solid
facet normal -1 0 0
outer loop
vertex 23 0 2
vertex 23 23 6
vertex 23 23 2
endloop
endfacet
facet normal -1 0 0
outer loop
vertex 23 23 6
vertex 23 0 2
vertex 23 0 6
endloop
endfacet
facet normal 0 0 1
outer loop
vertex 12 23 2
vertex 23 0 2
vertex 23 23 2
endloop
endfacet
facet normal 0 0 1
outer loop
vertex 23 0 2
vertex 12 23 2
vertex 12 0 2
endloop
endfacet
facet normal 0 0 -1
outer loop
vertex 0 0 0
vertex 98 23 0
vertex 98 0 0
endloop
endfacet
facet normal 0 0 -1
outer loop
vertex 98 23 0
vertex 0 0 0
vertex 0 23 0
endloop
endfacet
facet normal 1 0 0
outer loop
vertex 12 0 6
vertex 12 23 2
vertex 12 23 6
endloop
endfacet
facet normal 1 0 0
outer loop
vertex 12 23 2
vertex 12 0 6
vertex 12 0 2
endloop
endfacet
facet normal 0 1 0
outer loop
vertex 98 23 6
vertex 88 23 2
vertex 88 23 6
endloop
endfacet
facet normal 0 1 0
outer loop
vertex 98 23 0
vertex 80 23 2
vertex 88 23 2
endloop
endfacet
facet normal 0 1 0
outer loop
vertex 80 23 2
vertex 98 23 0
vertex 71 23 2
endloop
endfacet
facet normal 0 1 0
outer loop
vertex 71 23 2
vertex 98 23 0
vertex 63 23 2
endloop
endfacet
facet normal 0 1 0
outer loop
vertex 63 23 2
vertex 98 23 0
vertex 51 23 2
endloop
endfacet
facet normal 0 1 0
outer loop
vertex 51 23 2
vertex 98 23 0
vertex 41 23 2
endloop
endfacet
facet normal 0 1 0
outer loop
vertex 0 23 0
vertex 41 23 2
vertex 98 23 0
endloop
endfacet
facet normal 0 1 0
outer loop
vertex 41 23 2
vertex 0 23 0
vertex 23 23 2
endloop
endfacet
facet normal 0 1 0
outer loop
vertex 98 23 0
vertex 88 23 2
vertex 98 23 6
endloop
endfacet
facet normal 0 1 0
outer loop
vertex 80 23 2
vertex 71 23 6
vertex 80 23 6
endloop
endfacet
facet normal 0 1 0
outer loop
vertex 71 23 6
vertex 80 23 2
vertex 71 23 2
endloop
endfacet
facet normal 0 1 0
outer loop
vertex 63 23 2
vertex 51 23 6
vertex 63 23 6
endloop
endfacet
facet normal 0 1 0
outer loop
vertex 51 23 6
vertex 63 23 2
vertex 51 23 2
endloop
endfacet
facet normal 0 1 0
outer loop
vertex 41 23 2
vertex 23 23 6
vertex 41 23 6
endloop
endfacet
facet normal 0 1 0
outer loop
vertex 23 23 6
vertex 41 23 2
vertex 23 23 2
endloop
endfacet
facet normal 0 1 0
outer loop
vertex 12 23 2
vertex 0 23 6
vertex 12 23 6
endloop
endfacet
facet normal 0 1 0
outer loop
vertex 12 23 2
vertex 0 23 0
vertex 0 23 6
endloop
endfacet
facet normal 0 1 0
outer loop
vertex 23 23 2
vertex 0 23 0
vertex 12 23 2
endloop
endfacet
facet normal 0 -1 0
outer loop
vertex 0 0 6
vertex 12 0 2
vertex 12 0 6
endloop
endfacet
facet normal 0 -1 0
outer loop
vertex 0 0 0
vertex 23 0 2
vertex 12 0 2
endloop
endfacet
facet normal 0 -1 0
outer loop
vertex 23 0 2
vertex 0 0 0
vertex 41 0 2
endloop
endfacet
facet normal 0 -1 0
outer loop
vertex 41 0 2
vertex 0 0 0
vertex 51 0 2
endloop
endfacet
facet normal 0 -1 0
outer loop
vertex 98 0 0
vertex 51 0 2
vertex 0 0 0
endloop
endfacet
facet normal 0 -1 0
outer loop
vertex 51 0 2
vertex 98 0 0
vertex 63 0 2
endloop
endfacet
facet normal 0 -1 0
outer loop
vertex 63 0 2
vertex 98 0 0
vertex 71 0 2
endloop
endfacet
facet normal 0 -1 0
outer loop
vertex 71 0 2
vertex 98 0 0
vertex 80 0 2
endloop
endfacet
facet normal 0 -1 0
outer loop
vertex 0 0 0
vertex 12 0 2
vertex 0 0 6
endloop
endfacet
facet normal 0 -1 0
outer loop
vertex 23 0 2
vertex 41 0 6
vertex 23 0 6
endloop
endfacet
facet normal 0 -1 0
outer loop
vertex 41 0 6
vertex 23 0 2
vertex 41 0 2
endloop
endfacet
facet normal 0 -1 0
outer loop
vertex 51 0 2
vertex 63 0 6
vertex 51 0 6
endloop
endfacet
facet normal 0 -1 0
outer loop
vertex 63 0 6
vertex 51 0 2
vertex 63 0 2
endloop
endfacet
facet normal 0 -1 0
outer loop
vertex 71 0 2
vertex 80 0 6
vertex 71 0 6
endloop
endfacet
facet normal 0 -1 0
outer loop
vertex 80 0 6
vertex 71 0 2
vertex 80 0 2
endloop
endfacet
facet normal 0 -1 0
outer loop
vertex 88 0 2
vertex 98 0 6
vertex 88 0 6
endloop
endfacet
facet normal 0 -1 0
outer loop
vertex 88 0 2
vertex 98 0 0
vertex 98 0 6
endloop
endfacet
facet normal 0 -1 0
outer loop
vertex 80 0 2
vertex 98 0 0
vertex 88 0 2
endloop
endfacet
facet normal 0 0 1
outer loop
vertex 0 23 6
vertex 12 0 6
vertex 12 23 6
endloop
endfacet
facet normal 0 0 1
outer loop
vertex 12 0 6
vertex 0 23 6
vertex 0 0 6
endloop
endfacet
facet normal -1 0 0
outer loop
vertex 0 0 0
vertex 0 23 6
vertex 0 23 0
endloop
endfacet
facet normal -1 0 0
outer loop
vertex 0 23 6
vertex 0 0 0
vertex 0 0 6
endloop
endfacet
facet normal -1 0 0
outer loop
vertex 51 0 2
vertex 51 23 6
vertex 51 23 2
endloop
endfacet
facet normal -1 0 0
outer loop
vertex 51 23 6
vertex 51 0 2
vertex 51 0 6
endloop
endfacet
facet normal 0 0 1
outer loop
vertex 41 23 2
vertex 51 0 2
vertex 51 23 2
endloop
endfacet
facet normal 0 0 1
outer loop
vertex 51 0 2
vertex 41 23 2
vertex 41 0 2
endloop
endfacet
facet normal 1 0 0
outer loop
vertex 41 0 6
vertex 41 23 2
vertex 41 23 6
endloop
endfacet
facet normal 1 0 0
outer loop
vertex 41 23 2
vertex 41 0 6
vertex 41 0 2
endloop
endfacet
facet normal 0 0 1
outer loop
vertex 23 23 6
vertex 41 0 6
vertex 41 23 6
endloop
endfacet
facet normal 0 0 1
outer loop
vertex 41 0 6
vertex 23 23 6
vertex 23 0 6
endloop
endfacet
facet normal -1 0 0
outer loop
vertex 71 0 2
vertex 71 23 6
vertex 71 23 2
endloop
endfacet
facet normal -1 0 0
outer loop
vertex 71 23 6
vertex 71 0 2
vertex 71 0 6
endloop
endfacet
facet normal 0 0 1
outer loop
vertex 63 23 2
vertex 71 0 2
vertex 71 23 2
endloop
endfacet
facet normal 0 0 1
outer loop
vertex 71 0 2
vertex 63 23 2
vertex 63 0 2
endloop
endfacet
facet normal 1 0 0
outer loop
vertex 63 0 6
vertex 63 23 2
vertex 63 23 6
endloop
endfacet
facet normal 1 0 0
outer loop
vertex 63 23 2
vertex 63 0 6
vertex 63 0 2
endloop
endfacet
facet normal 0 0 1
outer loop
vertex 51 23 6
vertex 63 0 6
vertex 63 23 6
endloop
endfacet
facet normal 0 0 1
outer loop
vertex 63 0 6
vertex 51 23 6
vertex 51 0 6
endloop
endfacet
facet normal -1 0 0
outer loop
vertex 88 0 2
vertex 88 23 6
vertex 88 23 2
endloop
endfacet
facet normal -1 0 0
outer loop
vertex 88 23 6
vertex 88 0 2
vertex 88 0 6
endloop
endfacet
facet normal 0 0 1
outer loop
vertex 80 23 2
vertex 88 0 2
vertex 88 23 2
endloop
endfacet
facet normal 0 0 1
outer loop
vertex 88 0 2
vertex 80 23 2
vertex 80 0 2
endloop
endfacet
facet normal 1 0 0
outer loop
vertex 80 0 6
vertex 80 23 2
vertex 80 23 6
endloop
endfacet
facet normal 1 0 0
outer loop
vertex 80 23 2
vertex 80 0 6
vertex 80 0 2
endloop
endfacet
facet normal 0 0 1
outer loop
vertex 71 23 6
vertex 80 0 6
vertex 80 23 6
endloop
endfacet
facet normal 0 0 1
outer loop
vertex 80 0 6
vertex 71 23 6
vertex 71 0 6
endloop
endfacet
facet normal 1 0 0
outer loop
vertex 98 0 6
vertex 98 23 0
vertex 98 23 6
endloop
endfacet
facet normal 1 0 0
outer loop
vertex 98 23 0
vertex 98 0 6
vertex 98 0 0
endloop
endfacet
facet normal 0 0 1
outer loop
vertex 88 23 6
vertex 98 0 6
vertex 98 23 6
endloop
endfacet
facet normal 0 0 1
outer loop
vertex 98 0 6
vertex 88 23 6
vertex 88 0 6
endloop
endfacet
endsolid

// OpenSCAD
thickness=2;
wall_thickness=4+thickness;
spana_hold_height=23;
total_move=0;
h_width=8;
w_width=9;


module spana_holder(move_x=8+9,hold_width=8,wall_width=9)
{
  translate([move_x,0,0])
  {
    translate([wall_width,0,0]){
      cube([hold_width,spana_hold_height,thickness],center=false);
    }
    cube([wall_width,spana_hold_height,wall_thickness],center=false);

  }
}



//total_move= 0+h_width;
//total_move=total_move+w_width;
//echo(total_move);
spana_holder(move_x=0,hold_width=11,wall_width=12);
spana_holder(move_x=11+12,hold_width=10,wall_width=18);
spana_holder(move_x=11+12+10+18,hold_width=8,wall_width=12);
spana_holder(move_x=11+12+10+18+8+12,hold_width=8,wall_width=9);
//last
translate([11+12+10+18+8+12+8+9,0,0])
cube([10,spana_hold_height,wall_thickness],center=false);
